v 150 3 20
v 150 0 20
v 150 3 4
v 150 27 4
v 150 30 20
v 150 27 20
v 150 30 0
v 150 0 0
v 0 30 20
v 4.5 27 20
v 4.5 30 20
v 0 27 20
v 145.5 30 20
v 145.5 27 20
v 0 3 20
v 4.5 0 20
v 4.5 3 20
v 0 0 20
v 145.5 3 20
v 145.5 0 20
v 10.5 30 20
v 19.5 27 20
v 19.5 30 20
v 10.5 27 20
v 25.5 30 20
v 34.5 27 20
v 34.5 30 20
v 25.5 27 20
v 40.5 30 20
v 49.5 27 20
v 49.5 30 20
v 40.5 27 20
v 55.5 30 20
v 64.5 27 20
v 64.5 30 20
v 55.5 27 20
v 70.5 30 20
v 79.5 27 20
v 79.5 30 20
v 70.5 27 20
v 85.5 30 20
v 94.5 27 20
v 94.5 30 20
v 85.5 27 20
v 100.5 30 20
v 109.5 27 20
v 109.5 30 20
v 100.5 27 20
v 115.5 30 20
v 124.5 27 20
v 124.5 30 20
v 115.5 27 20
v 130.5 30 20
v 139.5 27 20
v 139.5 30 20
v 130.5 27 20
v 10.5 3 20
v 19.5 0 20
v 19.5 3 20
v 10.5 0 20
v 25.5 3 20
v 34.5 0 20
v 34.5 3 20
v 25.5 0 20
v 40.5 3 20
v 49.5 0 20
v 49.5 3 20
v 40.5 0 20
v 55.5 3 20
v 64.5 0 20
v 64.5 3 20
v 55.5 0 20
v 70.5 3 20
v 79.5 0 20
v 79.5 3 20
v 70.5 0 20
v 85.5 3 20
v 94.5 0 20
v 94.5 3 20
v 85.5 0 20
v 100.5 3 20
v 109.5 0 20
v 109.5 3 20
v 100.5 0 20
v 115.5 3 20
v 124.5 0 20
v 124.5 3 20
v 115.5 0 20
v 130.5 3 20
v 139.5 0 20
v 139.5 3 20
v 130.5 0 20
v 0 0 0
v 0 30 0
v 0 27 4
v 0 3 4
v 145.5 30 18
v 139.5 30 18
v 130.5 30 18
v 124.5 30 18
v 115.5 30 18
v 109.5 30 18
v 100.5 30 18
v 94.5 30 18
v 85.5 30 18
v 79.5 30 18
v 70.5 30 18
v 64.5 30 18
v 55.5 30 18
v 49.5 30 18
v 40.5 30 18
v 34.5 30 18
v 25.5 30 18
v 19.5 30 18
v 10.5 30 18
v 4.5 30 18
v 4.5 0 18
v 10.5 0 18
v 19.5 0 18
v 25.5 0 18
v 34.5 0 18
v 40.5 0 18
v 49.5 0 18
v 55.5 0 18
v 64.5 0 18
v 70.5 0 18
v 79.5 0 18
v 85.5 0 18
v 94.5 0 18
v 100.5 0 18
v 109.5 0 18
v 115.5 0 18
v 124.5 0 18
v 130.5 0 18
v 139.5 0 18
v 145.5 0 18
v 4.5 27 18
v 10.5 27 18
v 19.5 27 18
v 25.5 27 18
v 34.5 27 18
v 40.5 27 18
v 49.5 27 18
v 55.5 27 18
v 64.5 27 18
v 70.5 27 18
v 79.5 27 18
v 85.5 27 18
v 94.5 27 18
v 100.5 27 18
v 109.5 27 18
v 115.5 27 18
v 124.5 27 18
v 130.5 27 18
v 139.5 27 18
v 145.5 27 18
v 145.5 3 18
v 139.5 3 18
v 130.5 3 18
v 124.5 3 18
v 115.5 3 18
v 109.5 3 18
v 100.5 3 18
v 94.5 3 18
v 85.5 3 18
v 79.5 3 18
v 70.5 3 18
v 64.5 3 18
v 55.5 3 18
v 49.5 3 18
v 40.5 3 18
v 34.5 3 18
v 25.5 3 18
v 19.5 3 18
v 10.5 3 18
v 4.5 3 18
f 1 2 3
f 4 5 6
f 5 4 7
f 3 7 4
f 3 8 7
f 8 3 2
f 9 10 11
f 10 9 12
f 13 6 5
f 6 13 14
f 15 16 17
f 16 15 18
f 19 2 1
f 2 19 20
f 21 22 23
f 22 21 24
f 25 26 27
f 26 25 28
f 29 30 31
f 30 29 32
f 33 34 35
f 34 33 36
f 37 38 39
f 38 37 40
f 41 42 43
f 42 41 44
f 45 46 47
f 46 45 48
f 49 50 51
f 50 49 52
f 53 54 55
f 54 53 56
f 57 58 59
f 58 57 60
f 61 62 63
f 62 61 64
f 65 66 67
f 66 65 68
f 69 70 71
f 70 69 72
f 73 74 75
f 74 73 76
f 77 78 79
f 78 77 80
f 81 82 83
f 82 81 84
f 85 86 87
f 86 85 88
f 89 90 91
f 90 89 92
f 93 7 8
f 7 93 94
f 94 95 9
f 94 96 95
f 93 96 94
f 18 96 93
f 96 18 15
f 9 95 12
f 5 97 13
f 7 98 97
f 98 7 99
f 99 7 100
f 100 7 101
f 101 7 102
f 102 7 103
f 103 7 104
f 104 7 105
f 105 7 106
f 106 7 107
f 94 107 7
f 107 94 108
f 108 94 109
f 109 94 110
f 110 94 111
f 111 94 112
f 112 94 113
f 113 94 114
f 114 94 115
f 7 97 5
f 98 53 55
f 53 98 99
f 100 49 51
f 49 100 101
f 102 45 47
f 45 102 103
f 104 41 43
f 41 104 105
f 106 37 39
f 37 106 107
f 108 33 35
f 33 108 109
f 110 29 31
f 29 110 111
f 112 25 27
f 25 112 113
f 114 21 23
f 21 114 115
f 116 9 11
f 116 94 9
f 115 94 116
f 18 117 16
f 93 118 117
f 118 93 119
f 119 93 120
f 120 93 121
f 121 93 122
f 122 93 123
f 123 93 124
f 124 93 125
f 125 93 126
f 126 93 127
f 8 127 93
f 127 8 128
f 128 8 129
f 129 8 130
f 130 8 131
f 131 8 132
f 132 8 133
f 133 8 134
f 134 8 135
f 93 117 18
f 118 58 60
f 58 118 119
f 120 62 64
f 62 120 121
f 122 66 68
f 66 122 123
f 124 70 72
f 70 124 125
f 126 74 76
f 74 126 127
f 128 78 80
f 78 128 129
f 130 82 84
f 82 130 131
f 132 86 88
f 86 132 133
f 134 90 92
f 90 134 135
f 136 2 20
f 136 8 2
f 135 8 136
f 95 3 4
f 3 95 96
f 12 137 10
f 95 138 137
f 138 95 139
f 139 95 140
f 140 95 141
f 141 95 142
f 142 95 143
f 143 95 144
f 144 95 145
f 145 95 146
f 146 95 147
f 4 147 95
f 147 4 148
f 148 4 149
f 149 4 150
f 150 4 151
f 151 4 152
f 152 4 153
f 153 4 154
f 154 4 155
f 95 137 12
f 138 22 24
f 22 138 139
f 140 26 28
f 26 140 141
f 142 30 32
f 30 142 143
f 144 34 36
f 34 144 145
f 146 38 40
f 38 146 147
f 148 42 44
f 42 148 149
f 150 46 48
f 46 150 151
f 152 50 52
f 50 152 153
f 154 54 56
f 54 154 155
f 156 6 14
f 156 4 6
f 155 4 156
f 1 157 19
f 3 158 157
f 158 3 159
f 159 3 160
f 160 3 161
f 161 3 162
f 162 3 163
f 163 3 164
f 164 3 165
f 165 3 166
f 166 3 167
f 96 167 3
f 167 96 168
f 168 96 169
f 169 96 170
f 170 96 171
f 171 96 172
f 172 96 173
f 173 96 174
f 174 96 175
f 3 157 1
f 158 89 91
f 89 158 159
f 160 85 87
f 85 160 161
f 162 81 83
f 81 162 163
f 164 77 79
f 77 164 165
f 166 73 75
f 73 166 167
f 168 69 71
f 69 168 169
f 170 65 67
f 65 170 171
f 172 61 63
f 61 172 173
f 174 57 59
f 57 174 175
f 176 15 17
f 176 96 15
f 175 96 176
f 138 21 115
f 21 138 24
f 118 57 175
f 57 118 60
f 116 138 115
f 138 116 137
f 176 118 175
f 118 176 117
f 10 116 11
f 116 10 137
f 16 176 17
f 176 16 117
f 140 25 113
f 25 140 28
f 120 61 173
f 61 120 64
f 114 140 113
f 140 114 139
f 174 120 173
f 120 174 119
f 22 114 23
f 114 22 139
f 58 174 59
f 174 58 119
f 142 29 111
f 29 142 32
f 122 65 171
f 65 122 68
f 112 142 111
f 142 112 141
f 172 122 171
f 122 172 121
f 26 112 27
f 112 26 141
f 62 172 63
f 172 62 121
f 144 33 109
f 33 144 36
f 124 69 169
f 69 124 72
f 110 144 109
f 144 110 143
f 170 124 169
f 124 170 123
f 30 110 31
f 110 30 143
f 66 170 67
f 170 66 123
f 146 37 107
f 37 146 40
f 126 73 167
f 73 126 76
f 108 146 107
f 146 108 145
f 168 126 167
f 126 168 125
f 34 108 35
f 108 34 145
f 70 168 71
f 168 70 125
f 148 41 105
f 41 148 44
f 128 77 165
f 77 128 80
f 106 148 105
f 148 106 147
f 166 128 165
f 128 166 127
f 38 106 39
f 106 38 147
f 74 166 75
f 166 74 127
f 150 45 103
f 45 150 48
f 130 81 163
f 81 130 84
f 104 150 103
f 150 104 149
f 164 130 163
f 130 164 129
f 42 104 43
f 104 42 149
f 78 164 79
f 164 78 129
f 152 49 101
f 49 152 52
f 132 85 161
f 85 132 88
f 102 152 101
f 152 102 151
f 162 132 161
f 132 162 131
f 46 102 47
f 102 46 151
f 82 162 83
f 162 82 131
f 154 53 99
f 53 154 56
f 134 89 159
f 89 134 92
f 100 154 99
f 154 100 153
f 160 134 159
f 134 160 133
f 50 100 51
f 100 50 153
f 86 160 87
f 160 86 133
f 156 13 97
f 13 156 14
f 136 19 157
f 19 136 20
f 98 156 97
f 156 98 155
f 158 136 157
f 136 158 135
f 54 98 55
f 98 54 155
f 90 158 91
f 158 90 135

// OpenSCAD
$fn = 32;

// ----------------------------------------------------------------------
// Cable duct: 150 x 30 x 20 mm, 10 fingers
// ----------------------------------------------------------------------

// --- parameters (mm) ---
duct_len = 150;           // duct length, X
duct_w = 30;              // duct width, Y
duct_h = 20;              // duct height, Z
wall_t = 3;               // side wall thickness
floor_t = 4;              // floor thickness
slot_w = 6;               // finger slot width
slot_h = 14;              // finger slot height
fingers = 10;             // number of finger slots per side
pitch = 15;               // finger pitch

module shell() {
  difference() {
    cube([duct_len, duct_w, duct_h]);
    /* open top channel */
    translate([-wall_t - 1, wall_t, floor_t])
      cube([duct_len + 2 * wall_t + 2, duct_w - 2 * wall_t, duct_h + 1]);
  }
}

difference() {
  union() {
    shell();
  }
  /* finger slots cut through both side walls */
  for (i = [0 : fingers - 1]) translate([pitch / 2 + i * pitch - slot_w / 2, -1, floor_t + slot_h]) cube([slot_w, duct_w + 2, duct_h]);
}
